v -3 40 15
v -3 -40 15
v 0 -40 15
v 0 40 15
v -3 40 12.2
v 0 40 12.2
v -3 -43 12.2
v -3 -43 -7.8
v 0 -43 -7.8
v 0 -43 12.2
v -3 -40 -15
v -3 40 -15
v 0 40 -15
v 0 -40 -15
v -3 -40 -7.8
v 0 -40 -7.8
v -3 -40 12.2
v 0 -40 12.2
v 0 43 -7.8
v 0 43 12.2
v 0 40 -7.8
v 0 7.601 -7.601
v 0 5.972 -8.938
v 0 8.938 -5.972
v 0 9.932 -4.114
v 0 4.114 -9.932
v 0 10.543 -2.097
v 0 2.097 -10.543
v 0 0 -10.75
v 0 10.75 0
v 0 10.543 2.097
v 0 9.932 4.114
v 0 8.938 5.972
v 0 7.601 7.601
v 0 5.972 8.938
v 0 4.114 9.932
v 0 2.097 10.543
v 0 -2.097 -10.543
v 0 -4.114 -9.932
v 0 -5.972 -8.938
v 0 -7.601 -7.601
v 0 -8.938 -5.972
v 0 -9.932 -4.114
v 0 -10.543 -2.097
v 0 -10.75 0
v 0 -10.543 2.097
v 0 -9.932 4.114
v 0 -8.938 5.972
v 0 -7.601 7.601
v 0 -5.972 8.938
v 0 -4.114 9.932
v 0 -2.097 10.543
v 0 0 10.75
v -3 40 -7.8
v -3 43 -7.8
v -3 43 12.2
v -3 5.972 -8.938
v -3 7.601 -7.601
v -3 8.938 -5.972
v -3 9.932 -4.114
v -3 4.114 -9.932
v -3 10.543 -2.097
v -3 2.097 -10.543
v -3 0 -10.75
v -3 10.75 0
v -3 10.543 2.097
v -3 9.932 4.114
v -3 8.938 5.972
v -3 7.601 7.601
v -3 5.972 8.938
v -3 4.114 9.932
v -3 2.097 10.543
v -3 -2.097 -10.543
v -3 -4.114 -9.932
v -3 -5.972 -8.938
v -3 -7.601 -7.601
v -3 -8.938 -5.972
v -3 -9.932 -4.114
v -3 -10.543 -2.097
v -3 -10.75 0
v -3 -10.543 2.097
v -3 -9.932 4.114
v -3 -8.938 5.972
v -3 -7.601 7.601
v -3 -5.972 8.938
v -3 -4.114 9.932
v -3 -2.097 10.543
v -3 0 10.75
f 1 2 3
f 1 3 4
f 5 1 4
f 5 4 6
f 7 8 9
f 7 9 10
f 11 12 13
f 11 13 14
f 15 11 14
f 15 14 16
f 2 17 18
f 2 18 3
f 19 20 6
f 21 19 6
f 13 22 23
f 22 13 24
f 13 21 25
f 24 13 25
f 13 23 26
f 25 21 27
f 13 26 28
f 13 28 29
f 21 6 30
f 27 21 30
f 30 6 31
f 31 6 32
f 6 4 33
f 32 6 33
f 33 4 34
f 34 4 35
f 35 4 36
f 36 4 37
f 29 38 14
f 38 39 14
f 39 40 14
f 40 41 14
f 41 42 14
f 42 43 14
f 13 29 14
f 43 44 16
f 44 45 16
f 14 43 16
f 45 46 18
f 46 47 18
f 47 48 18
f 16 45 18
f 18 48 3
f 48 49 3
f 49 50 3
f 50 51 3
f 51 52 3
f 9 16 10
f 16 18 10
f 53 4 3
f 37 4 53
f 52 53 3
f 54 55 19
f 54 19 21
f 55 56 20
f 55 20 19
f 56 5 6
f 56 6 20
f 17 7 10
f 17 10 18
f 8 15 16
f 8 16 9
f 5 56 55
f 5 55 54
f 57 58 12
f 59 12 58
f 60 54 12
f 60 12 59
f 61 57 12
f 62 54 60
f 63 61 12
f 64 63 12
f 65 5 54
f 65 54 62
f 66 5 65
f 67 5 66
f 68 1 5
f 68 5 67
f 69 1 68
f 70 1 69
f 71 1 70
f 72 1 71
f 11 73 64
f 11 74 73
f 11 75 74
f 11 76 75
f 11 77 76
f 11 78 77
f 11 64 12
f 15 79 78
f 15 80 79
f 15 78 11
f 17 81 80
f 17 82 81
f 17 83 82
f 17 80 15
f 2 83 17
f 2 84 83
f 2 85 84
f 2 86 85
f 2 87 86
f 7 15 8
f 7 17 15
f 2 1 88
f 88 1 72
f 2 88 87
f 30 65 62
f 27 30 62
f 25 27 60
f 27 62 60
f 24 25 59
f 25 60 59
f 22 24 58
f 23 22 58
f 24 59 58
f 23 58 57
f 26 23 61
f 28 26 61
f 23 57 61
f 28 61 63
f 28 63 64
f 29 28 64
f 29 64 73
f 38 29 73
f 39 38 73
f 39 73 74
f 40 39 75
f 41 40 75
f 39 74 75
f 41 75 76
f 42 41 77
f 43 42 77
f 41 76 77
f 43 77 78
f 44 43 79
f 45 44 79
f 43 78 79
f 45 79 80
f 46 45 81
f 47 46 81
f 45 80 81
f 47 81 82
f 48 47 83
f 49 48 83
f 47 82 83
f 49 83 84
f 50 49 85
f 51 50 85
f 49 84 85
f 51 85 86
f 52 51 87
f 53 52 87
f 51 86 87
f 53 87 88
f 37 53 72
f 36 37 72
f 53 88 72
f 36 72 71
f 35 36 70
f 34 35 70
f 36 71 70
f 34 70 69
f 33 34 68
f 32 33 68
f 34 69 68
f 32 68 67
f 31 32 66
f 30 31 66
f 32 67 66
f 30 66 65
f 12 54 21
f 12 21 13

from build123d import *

# Parameters (mm, degrees)
ESQUISSE1_R        = 10.75
BOSS_EXTRU_1_DEPTH = 3


with BuildPart() as part:
    # Esquisse1 → Boss.-Extru.1 (new body)
    with BuildSketch(Plane(origin=(-3, 0, 0), x_dir=(0, -1, 0), z_dir=(-1, 0, 0))):
        Polygon((40, 15), (-40, 15), (-40, 12.2), (-43, 12.2), (-43, -7.8), (-40, -7.8), (-40, -15), (40, -15), (40, -7.8), (43, -7.8), (43, 12.2), (40, 12.2), align=None)
        with Locations(Location((0, 0, 0), (0, 0, 180))):
            Circle(ESQUISSE1_R, mode=Mode.SUBTRACT)
    extrude(amount=-BOSS_EXTRU_1_DEPTH)


solid = part.part
